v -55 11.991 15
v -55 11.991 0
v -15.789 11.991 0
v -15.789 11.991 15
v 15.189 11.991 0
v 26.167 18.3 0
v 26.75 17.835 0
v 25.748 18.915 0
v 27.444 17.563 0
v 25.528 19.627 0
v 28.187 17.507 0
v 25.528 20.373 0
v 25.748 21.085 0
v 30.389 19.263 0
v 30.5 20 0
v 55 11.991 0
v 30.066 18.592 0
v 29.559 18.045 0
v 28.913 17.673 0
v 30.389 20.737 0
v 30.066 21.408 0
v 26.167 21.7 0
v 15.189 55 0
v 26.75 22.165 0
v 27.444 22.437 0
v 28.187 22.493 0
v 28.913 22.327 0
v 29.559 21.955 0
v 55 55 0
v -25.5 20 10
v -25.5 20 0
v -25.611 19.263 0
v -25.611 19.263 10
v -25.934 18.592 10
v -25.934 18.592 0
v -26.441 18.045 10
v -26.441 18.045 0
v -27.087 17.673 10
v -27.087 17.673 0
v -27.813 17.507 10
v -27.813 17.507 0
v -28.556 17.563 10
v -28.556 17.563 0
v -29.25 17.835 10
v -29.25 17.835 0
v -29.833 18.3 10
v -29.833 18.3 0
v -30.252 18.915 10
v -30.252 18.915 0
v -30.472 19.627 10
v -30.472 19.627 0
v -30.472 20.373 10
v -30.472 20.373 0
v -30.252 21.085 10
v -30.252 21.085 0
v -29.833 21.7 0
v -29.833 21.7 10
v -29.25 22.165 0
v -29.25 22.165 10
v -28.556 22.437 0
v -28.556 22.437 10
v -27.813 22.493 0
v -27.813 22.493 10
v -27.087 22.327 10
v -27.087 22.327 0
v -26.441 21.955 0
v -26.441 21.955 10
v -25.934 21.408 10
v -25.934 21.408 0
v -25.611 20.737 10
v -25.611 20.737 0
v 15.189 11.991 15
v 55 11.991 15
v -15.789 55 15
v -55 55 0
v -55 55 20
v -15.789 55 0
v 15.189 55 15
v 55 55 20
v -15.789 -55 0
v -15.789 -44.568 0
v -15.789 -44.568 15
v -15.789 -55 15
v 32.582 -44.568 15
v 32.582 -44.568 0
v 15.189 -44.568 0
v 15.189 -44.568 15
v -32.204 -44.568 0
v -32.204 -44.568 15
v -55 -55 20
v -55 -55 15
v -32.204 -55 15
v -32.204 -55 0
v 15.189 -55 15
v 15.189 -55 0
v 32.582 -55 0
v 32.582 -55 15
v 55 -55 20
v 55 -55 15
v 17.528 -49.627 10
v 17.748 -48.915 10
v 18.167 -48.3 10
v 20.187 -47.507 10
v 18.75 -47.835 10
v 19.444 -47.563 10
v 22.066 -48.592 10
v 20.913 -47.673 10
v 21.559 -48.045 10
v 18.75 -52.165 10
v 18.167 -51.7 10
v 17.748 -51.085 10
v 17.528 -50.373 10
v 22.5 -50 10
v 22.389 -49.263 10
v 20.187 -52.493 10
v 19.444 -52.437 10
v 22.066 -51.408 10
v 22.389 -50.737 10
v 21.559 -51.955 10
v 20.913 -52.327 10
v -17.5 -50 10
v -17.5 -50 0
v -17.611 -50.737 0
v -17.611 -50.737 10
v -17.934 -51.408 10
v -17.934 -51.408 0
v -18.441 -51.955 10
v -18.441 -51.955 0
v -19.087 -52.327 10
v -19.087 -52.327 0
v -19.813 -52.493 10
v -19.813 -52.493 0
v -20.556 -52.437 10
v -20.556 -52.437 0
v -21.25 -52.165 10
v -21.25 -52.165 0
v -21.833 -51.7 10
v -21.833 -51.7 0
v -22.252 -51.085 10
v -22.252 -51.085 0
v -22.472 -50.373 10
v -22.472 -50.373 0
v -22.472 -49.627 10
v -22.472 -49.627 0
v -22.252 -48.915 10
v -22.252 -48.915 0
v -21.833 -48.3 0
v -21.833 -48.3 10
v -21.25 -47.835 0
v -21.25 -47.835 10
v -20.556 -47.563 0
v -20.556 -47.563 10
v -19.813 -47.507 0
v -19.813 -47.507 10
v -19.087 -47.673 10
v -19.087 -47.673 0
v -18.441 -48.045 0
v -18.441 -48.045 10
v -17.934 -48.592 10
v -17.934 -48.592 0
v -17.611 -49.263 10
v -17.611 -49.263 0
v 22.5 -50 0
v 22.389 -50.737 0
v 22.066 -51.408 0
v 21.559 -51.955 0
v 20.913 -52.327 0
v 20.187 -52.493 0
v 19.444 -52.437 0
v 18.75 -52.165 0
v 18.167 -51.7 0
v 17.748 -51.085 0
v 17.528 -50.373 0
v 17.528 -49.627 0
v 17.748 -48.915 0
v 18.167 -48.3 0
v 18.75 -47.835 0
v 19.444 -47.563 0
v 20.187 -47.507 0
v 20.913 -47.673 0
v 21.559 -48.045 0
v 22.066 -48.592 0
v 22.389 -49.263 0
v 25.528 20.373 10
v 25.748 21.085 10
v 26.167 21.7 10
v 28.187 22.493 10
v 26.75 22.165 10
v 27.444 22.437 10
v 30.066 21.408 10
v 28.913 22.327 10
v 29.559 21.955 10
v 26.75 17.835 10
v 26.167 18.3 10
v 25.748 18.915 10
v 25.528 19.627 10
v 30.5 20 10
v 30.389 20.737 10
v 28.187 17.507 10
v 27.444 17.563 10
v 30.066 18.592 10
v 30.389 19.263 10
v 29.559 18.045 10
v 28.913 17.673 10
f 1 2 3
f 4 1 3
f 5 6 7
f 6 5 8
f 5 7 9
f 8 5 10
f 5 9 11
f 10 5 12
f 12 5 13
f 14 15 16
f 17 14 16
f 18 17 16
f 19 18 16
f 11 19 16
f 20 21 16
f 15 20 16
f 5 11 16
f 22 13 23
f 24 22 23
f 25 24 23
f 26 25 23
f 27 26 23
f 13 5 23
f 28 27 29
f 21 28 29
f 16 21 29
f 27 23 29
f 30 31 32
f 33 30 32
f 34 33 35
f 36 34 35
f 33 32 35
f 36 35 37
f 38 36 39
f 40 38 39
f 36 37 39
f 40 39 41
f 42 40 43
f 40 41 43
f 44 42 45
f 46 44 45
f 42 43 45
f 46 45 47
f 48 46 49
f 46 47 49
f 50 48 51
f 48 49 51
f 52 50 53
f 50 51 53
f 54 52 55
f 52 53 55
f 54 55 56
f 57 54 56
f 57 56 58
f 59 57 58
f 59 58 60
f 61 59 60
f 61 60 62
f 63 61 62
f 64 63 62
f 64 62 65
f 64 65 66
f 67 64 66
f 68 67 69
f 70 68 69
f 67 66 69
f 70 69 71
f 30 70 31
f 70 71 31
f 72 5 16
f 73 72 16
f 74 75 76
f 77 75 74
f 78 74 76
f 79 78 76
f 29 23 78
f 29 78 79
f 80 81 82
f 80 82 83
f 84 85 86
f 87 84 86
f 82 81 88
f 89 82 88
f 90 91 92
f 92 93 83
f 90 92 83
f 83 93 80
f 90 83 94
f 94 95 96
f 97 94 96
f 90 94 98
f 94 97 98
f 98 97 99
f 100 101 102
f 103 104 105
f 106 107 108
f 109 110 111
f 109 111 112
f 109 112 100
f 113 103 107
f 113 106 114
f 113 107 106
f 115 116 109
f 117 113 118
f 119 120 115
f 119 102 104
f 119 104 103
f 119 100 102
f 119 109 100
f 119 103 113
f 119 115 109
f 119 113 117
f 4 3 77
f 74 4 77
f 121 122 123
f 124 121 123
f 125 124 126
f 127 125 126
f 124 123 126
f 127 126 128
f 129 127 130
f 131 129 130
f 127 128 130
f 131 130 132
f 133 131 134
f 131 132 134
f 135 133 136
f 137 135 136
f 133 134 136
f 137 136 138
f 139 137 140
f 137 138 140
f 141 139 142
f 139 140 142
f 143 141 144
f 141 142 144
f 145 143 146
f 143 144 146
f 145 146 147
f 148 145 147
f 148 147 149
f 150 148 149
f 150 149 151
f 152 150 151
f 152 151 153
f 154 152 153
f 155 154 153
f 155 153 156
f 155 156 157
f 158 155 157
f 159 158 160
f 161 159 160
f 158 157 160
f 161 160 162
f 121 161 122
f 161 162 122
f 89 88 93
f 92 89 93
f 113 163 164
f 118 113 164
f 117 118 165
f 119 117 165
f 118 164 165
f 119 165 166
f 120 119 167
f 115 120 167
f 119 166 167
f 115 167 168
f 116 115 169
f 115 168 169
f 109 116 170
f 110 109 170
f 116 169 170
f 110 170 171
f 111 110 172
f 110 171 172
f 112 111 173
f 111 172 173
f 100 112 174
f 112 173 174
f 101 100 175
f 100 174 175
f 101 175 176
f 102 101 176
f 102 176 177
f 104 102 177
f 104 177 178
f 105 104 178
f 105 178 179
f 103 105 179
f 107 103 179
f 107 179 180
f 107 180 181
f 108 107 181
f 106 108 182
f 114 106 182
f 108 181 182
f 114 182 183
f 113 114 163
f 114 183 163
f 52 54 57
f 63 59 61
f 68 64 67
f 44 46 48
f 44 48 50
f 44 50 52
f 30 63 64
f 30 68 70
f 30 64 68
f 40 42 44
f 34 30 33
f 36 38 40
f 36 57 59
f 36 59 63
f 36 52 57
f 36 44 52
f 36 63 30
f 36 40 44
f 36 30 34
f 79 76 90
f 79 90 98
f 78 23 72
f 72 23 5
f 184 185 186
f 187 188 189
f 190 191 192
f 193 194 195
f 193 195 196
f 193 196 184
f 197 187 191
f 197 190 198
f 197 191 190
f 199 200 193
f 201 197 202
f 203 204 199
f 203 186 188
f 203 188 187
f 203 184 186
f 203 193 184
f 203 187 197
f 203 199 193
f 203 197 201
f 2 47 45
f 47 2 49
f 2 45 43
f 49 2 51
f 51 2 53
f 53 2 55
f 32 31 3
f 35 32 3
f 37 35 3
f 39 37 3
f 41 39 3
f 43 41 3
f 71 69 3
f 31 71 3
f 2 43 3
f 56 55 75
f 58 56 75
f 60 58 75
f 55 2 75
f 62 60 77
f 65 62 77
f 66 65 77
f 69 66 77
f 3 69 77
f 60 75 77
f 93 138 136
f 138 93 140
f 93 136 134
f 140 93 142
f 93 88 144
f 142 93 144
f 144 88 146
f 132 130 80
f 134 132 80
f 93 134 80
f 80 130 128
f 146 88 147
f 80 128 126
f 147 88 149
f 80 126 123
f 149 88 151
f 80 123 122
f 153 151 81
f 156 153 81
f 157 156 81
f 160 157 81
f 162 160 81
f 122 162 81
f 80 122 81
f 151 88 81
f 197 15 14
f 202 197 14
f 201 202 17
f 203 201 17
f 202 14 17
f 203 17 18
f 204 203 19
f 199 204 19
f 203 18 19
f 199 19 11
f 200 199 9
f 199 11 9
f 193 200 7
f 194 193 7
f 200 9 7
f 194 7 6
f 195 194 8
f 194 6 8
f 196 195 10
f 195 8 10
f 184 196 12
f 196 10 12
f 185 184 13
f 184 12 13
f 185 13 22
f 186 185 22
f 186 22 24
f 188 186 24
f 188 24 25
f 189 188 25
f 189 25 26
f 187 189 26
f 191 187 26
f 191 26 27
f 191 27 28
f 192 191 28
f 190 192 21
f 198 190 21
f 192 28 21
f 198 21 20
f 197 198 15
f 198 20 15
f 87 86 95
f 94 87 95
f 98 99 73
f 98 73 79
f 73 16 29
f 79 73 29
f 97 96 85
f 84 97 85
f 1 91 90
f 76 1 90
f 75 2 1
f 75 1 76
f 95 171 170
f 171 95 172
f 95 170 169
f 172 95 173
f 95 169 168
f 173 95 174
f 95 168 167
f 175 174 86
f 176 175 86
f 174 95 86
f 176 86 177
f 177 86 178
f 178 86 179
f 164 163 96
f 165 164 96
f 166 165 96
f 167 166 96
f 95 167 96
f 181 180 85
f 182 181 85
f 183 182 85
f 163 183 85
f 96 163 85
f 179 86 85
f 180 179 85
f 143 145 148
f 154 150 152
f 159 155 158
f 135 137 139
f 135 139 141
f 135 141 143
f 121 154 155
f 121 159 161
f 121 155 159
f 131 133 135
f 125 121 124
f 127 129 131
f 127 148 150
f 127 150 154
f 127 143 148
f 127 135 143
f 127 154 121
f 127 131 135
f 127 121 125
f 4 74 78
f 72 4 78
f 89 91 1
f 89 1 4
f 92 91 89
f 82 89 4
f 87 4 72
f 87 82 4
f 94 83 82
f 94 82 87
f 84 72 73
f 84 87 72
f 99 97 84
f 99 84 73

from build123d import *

# Parameters (mm, degrees)
F0_W     = 110
F0_H     = 110
F1_DEPTH = 20
F2_R     = 2.5
F3_DEPTH = 10
F4_W     = 30.978008
F4_H     = 10.43164
F5_DEPTH = 15


with BuildPart() as f1:
    # F0 (on Top) → F1 (new body)
    with BuildSketch(Plane.XY):
        Rectangle(F0_W, F0_H)
    extrude(amount=F1_DEPTH)

    # F2 (on face) → F3 (cut)
    with BuildSketch(Plane(origin=(0, 0, 0), x_dir=(1, 0, 0), z_dir=(0, 0, -1))):
        with Locations((20, 50)):
            Circle(F2_R)
        with Locations((-20, 50)):
            Circle(F2_R)
        with Locations((28, -20)):
            Circle(F2_R)
        with Locations((-28, -20)):
            Circle(F2_R)
    extrude(amount=-F3_DEPTH, mode=Mode.SUBTRACT)

    # F4 (on face) → F5 (cut)
    with BuildSketch(Plane(origin=(0, 0, 0), x_dir=(1, 0, 0), z_dir=(0, 0, -1))):
        Polygon((15.189216, -11.991489), (55, -11.991489), (55, 44.56836), (55, 55), (32.581832, 55), (32.581832, 44.56836), (15.189216, 44.56836), (-15.788792, 44.56836), (-32.204367, 44.56836), (-32.204367, 55), (-55, 55), (-55, 44.56836), (-55, -11.991489), (-15.788792, -11.991489), (-15.788792, -55), (15.189216, -55), align=None)
        with Locations((-0.299788, 49.78418)):
            Rectangle(F4_W, F4_H)
    extrude(amount=-F5_DEPTH, mode=Mode.SUBTRACT)


solid = f1.part
